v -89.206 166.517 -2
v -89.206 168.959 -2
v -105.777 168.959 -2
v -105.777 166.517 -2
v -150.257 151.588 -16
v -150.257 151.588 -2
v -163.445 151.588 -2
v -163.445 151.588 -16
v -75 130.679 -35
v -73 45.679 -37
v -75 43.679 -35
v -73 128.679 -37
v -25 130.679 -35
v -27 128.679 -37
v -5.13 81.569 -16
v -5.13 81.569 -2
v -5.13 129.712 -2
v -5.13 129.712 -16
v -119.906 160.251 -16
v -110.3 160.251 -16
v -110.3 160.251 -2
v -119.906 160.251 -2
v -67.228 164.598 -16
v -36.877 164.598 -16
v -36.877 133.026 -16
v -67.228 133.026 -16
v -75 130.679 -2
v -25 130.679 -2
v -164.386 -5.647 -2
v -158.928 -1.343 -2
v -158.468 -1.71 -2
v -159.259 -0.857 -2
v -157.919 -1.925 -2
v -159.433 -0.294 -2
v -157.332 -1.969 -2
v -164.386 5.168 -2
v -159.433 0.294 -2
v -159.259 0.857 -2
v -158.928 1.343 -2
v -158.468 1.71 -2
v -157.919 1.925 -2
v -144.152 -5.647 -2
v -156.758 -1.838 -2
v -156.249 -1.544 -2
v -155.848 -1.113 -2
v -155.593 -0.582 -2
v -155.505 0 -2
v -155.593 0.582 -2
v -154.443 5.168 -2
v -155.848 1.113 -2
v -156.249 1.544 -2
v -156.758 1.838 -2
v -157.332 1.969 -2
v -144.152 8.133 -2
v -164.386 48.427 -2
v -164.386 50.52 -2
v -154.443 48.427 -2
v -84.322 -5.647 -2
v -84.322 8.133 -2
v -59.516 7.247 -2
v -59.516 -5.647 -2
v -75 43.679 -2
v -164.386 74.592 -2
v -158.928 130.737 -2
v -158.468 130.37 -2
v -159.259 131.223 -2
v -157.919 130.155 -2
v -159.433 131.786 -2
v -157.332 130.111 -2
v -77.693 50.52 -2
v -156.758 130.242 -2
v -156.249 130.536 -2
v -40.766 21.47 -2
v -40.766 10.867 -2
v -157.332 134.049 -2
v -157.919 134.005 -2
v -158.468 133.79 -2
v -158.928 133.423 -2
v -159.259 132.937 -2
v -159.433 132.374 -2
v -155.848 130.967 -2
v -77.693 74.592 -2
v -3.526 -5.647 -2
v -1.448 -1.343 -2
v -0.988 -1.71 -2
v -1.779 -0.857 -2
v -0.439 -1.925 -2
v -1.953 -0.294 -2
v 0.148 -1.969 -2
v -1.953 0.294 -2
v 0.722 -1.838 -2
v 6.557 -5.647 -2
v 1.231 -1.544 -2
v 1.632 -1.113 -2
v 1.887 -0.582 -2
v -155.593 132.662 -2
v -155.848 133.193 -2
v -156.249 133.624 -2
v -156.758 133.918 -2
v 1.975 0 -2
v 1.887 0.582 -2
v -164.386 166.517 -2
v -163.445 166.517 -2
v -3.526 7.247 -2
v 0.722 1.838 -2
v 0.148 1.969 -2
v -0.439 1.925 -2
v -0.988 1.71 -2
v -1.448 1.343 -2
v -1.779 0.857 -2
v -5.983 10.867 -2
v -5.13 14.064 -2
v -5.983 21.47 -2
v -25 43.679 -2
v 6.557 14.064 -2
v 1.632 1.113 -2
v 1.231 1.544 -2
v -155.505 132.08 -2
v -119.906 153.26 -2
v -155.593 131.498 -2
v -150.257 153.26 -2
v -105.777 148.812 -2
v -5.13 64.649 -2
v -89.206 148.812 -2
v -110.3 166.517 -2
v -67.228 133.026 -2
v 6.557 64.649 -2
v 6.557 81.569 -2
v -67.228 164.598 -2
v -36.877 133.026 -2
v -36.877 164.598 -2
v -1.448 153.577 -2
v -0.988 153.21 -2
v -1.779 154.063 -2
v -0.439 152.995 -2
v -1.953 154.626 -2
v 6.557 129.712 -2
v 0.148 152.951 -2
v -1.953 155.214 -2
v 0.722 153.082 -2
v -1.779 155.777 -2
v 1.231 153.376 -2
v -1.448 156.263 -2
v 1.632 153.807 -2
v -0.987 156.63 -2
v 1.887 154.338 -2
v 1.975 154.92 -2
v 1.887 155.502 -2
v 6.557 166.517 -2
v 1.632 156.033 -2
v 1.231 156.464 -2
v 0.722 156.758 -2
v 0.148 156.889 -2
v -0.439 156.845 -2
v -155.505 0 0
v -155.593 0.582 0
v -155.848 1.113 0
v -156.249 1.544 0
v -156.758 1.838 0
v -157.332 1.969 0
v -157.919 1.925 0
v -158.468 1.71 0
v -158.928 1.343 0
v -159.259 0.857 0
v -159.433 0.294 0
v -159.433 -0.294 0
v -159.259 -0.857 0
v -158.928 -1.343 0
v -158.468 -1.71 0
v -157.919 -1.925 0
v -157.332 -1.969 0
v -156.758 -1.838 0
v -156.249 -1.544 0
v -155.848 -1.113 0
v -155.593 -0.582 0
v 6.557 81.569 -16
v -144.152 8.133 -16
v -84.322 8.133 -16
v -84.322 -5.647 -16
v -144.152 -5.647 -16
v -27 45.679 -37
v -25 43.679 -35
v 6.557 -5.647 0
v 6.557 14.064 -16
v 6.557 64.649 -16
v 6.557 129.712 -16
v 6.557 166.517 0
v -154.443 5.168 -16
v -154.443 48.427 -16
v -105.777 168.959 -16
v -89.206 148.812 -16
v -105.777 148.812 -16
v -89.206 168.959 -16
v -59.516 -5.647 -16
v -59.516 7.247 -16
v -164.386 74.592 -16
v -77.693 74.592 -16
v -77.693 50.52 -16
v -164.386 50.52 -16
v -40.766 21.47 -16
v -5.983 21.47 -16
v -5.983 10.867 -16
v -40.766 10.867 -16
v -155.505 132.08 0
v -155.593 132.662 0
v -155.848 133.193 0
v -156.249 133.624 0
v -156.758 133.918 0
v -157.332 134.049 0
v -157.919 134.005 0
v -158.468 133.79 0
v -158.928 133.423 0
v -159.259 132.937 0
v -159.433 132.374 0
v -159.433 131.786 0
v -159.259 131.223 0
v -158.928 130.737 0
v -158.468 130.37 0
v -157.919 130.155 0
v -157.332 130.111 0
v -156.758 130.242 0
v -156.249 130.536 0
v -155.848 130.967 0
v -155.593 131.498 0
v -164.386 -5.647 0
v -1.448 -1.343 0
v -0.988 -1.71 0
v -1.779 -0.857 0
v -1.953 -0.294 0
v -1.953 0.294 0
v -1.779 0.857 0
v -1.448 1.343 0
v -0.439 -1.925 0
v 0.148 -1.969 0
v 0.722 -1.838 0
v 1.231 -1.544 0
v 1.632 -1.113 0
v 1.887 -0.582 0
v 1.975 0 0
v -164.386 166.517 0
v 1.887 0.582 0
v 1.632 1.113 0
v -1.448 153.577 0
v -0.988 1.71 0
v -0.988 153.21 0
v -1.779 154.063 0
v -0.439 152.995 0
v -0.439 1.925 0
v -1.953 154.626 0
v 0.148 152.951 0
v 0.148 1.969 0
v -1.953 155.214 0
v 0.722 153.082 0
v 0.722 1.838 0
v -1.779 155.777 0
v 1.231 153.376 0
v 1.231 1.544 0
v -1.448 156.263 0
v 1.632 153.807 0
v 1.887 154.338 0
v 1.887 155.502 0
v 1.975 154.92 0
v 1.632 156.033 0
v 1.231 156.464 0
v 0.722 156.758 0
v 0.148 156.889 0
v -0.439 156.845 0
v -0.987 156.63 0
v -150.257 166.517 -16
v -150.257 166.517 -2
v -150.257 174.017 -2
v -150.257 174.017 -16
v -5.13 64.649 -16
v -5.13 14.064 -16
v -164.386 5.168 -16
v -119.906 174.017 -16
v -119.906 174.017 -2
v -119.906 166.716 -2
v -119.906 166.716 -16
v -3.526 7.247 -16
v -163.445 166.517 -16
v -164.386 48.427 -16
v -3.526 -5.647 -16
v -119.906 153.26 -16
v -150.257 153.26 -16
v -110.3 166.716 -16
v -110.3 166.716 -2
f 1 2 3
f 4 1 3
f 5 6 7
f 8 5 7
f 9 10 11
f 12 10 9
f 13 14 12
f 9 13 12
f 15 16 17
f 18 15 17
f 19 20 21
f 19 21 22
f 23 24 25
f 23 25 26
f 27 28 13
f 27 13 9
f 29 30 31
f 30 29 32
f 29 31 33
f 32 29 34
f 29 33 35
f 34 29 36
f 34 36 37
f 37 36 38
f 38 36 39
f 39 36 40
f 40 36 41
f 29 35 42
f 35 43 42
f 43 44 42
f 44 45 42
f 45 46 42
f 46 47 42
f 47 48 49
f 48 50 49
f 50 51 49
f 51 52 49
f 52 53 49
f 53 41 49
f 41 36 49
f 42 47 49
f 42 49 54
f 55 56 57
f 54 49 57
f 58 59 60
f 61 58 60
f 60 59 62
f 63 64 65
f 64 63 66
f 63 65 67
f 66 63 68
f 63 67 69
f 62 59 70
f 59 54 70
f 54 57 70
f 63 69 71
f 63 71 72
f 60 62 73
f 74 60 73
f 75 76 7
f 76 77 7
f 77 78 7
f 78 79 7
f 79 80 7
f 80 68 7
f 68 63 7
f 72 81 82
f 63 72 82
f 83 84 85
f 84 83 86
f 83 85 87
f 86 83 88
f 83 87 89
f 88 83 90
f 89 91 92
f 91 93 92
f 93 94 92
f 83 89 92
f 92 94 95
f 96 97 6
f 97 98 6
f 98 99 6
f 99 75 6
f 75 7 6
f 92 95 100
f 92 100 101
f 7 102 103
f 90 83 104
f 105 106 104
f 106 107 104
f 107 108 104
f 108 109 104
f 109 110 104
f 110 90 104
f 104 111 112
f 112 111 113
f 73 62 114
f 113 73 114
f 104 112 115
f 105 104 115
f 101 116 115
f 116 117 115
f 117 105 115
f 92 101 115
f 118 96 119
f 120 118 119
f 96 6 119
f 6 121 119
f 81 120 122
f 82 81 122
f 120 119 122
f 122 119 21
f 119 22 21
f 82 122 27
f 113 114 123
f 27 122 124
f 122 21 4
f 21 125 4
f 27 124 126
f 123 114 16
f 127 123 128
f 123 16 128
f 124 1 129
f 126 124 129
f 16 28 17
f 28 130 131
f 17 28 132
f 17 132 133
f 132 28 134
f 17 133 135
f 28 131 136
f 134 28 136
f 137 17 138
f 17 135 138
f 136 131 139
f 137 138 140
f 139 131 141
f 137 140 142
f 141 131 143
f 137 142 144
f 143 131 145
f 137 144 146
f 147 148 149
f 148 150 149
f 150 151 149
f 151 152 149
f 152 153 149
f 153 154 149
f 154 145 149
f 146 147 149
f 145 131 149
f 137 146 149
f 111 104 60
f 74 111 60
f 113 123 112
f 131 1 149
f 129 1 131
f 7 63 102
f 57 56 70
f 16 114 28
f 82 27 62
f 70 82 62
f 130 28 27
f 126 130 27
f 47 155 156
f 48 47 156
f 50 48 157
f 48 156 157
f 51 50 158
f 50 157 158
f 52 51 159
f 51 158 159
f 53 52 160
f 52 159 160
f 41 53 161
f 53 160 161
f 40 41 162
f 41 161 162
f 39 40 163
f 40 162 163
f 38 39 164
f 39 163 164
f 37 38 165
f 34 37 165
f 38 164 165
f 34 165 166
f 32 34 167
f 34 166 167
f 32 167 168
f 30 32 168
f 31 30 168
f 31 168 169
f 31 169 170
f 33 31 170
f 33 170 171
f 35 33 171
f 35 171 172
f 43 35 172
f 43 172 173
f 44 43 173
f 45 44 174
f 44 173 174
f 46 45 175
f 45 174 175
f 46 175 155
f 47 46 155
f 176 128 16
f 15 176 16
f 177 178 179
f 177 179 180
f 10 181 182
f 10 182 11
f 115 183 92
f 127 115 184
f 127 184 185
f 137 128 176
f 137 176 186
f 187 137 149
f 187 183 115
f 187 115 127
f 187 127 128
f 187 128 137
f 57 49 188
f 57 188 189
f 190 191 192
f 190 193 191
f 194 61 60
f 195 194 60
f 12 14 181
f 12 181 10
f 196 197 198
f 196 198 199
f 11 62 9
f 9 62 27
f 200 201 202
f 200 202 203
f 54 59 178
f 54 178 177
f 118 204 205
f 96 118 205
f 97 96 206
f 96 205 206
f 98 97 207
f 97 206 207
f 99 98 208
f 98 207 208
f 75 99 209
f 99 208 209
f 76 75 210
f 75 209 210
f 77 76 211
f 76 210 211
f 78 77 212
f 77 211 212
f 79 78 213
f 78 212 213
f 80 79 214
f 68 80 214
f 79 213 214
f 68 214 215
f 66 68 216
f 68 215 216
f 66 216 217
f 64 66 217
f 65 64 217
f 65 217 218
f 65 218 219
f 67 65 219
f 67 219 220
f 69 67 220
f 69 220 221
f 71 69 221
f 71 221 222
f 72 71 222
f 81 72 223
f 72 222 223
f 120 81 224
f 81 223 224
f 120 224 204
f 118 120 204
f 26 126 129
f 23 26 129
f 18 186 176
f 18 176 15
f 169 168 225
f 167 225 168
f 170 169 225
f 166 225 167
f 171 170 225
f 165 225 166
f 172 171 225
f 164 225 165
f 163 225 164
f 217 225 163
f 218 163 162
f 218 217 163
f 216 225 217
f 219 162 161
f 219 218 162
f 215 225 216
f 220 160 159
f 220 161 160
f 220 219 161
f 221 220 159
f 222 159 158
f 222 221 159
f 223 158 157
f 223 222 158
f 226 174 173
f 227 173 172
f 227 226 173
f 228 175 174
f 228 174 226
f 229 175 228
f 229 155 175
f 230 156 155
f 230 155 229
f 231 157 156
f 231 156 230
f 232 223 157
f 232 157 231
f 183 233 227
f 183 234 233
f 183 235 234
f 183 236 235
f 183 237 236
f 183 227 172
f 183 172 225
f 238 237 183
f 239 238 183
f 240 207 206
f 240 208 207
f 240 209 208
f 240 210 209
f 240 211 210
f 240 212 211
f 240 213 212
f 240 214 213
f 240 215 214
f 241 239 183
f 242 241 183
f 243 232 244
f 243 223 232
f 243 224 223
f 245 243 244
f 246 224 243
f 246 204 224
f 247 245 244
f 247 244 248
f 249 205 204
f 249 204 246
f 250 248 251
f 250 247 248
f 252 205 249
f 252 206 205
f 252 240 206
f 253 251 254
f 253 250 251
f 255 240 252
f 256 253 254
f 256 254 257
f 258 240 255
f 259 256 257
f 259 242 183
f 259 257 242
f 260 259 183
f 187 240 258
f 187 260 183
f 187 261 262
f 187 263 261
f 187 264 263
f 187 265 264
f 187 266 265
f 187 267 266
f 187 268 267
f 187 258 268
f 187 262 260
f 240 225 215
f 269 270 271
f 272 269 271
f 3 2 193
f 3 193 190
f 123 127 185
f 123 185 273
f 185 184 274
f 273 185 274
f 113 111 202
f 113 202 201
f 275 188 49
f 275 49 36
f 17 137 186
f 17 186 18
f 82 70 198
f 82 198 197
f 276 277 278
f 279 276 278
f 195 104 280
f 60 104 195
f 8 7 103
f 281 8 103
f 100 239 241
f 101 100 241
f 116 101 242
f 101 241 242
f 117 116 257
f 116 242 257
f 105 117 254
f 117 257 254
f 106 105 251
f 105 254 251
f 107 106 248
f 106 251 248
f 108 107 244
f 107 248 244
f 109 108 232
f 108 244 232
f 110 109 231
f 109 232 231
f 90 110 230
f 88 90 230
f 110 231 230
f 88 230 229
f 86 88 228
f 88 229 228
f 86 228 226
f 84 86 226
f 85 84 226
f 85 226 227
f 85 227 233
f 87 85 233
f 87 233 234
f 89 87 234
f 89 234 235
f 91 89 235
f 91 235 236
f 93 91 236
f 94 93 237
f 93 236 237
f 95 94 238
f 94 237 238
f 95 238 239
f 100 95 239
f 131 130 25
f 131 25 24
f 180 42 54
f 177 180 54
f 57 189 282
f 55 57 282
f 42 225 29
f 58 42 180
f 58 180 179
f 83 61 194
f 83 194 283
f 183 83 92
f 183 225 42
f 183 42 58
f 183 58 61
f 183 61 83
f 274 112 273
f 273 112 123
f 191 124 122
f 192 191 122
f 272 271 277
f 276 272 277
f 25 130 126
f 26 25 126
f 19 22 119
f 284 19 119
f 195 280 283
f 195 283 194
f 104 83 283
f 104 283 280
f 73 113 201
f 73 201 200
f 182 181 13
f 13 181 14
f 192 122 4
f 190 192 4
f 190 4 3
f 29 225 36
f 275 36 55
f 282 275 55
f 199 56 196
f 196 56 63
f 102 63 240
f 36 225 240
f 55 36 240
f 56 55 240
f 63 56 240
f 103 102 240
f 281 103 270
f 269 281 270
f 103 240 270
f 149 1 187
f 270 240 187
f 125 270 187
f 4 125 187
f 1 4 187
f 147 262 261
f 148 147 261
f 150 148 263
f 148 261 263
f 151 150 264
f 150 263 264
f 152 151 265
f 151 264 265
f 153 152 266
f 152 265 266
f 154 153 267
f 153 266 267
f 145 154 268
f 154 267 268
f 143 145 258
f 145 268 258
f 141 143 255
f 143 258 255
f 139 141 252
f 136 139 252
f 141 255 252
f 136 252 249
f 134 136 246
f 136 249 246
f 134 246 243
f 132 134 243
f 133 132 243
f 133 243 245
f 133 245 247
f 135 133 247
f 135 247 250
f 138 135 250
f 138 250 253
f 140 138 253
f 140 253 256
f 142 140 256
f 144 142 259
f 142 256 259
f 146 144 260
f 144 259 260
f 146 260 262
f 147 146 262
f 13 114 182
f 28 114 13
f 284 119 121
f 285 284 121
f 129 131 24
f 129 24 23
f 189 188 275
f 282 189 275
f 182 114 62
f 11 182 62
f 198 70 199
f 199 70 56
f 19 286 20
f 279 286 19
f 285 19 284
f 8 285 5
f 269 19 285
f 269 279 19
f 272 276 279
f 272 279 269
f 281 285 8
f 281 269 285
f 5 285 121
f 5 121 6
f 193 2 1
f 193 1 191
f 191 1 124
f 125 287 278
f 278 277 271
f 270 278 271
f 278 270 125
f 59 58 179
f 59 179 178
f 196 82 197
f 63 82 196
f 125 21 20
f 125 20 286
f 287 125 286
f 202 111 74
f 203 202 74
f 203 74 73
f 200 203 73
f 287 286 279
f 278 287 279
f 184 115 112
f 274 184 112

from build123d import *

# Parameters (mm, degrees)
SKETCH_1_W      = 170.942557362
SKETCH_1_H      = 172.163575629
EXTRUDE_1_DEPTH = 2
SKETCH_2_W      = 50
SKETCH_2_H      = 87
EXTRUDE_2_DEPTH = 35
SKETCH_3_W      = 30.35102549
SKETCH_3_H      = 31.572043757
SKETCH_3_W_2    = 16.570962193
SKETCH_3_H_2    = 17.704764869
SKETCH_3_H_3    = 2.442036534
SKETCH_3_W_3    = 86.692296948
SKETCH_3_H_4    = 24.071502975
SKETCH_3_W_4    = 9.942577316
SKETCH_3_H_5    = 43.258932884
SKETCH_3_W_5    = 59.829895076
SKETCH_3_H_6    = 13.780063298
SKETCH_3_W_6    = 55.989922961
SKETCH_3_H_7    = 12.893447817
SKETCH_3_W_7    = 34.783578006
SKETCH_3_H_8    = 10.603172478
SKETCH_3_W_8    = 11.686889126
SKETCH_3_H_9    = 48.143005951
SKETCH_3_H_10   = 50.585042485
SKETCH_3_W_9    = 9.605807423
SKETCH_3_H_11   = 6.465349072
EXTRUDE_3_DEPTH = 14
CHAMFER_1_SIZE  = 2


with BuildPart() as part:
    # 草图1 → 凸台-拉伸1 (new body)
    with BuildSketch(Plane.XY):
        with Locations((-78.914431177, 80.434949445)):
            Rectangle(SKETCH_1_W, SKETCH_1_H)
        with BuildLine():
            ThreePointArc((-159.455, 0), (-157.48, -1.975), (-155.505, 0))
            ThreePointArc((-155.505, 0), (-157.48, 1.975), (-159.455, 0))
        make_face(mode=Mode.SUBTRACT)
        with BuildLine():
            ThreePointArc((-1.975, 0), (0, -1.975), (1.975, 0))
            ThreePointArc((1.975, 0), (0, 1.975), (-1.975, 0))
        make_face(mode=Mode.SUBTRACT)
        with BuildLine():
            ThreePointArc((-1.975, 154.919999989), (0, 152.944999989), (1.975, 154.919999989))
            ThreePointArc((1.975, 154.919999989), (0, 156.894999989), (-1.975, 154.919999989))
        make_face(mode=Mode.SUBTRACT)
        with BuildLine():
            ThreePointArc((-159.455, 132.08), (-157.48, 130.105), (-155.505, 132.08))
            ThreePointArc((-155.505, 132.08), (-157.48, 134.055), (-159.455, 132.08))
        make_face(mode=Mode.SUBTRACT)
    extrude(amount=-EXTRUDE_1_DEPTH)

    # 草图2 → 凸台-拉伸2 (add)
    with BuildSketch(Plane(origin=(0, 0, -2), x_dir=(-1, 0, 0), z_dir=(0, 0, -1))):
        with Locations((50, 87.178999994)):
            Rectangle(SKETCH_2_W, SKETCH_2_H)
    extrude(amount=EXTRUDE_2_DEPTH)

    # 草图3 → 凸台-拉伸3 (add)
    with BuildSketch(Plane(origin=(0, 0, -2), x_dir=(-1, 0, 0), z_dir=(0, 0, -1))):
        with Locations((52.052029306, 148.811972389)):
            Rectangle(SKETCH_3_W, SKETCH_3_H)
        with Locations((97.491351952, 157.664354825)):
            Rectangle(SKETCH_3_W_2, SKETCH_3_H_2)
        Polygon((150.256784199, 166.516737259), (119.905758708, 166.516737259), (119.905758708, 160.251119597), (119.905758708, 153.259967505), (150.256784199, 153.259967505), align=None)
        with Locations((97.491351952, 167.737755526)):
            Rectangle(SKETCH_3_W_2, SKETCH_3_H_3)
        Polygon((119.905758708, 166.716468669), (119.905758708, 166.516737259), (150.256784199, 166.516737259), (150.256784199, 166.716468669), (150.256784199, 174.017278041), (119.905758708, 174.017278041), align=None)
        Polygon((163.445120655, 166.516737259), (150.256784199, 166.516737259), (150.256784199, 153.259967505), (150.256784199, 151.587551841), (163.445120655, 151.587551841), align=None)
        with Locations((121.039561384, 62.555753395)):
            Rectangle(SKETCH_3_W_3, SKETCH_3_H_4)
        with Locations((159.4144212, 26.797361293)):
            Rectangle(SKETCH_3_W_4, SKETCH_3_H_5)
        with Locations((114.236745326, 1.243193279)):
            Rectangle(SKETCH_3_W_5, SKETCH_3_H_6)
        with Locations((31.520690489, 0.799885539)):
            Rectangle(SKETCH_3_W_6, SKETCH_3_H_7)
        with Locations((23.374350658, 16.168791166)):
            Rectangle(SKETCH_3_W_7, SKETCH_3_H_8)
        with Locations((-0.713402941, 105.640255096)):
            Rectangle(SKETCH_3_W_8, SKETCH_3_H_9)
        with Locations((-0.713402941, 39.356406323)):
            Rectangle(SKETCH_3_W_8, SKETCH_3_H_10)
        with Locations((115.102854997, 163.483794133)):
            Rectangle(SKETCH_3_W_9, SKETCH_3_H_11)
    extrude(amount=EXTRUDE_3_DEPTH)

    # 倒角1
    chamfer_1_edges = [part.edges().sort_by_distance(p)[0] for p in [
        (-25, 87.178999994, -37),
        (-50, 43.678999994, -37),
        (-75, 87.178999994, -37),
        (-50, 130.678999994, -37),
    ]]
    chamfer(chamfer_1_edges, length=CHAMFER_1_SIZE)


solid = part.part
